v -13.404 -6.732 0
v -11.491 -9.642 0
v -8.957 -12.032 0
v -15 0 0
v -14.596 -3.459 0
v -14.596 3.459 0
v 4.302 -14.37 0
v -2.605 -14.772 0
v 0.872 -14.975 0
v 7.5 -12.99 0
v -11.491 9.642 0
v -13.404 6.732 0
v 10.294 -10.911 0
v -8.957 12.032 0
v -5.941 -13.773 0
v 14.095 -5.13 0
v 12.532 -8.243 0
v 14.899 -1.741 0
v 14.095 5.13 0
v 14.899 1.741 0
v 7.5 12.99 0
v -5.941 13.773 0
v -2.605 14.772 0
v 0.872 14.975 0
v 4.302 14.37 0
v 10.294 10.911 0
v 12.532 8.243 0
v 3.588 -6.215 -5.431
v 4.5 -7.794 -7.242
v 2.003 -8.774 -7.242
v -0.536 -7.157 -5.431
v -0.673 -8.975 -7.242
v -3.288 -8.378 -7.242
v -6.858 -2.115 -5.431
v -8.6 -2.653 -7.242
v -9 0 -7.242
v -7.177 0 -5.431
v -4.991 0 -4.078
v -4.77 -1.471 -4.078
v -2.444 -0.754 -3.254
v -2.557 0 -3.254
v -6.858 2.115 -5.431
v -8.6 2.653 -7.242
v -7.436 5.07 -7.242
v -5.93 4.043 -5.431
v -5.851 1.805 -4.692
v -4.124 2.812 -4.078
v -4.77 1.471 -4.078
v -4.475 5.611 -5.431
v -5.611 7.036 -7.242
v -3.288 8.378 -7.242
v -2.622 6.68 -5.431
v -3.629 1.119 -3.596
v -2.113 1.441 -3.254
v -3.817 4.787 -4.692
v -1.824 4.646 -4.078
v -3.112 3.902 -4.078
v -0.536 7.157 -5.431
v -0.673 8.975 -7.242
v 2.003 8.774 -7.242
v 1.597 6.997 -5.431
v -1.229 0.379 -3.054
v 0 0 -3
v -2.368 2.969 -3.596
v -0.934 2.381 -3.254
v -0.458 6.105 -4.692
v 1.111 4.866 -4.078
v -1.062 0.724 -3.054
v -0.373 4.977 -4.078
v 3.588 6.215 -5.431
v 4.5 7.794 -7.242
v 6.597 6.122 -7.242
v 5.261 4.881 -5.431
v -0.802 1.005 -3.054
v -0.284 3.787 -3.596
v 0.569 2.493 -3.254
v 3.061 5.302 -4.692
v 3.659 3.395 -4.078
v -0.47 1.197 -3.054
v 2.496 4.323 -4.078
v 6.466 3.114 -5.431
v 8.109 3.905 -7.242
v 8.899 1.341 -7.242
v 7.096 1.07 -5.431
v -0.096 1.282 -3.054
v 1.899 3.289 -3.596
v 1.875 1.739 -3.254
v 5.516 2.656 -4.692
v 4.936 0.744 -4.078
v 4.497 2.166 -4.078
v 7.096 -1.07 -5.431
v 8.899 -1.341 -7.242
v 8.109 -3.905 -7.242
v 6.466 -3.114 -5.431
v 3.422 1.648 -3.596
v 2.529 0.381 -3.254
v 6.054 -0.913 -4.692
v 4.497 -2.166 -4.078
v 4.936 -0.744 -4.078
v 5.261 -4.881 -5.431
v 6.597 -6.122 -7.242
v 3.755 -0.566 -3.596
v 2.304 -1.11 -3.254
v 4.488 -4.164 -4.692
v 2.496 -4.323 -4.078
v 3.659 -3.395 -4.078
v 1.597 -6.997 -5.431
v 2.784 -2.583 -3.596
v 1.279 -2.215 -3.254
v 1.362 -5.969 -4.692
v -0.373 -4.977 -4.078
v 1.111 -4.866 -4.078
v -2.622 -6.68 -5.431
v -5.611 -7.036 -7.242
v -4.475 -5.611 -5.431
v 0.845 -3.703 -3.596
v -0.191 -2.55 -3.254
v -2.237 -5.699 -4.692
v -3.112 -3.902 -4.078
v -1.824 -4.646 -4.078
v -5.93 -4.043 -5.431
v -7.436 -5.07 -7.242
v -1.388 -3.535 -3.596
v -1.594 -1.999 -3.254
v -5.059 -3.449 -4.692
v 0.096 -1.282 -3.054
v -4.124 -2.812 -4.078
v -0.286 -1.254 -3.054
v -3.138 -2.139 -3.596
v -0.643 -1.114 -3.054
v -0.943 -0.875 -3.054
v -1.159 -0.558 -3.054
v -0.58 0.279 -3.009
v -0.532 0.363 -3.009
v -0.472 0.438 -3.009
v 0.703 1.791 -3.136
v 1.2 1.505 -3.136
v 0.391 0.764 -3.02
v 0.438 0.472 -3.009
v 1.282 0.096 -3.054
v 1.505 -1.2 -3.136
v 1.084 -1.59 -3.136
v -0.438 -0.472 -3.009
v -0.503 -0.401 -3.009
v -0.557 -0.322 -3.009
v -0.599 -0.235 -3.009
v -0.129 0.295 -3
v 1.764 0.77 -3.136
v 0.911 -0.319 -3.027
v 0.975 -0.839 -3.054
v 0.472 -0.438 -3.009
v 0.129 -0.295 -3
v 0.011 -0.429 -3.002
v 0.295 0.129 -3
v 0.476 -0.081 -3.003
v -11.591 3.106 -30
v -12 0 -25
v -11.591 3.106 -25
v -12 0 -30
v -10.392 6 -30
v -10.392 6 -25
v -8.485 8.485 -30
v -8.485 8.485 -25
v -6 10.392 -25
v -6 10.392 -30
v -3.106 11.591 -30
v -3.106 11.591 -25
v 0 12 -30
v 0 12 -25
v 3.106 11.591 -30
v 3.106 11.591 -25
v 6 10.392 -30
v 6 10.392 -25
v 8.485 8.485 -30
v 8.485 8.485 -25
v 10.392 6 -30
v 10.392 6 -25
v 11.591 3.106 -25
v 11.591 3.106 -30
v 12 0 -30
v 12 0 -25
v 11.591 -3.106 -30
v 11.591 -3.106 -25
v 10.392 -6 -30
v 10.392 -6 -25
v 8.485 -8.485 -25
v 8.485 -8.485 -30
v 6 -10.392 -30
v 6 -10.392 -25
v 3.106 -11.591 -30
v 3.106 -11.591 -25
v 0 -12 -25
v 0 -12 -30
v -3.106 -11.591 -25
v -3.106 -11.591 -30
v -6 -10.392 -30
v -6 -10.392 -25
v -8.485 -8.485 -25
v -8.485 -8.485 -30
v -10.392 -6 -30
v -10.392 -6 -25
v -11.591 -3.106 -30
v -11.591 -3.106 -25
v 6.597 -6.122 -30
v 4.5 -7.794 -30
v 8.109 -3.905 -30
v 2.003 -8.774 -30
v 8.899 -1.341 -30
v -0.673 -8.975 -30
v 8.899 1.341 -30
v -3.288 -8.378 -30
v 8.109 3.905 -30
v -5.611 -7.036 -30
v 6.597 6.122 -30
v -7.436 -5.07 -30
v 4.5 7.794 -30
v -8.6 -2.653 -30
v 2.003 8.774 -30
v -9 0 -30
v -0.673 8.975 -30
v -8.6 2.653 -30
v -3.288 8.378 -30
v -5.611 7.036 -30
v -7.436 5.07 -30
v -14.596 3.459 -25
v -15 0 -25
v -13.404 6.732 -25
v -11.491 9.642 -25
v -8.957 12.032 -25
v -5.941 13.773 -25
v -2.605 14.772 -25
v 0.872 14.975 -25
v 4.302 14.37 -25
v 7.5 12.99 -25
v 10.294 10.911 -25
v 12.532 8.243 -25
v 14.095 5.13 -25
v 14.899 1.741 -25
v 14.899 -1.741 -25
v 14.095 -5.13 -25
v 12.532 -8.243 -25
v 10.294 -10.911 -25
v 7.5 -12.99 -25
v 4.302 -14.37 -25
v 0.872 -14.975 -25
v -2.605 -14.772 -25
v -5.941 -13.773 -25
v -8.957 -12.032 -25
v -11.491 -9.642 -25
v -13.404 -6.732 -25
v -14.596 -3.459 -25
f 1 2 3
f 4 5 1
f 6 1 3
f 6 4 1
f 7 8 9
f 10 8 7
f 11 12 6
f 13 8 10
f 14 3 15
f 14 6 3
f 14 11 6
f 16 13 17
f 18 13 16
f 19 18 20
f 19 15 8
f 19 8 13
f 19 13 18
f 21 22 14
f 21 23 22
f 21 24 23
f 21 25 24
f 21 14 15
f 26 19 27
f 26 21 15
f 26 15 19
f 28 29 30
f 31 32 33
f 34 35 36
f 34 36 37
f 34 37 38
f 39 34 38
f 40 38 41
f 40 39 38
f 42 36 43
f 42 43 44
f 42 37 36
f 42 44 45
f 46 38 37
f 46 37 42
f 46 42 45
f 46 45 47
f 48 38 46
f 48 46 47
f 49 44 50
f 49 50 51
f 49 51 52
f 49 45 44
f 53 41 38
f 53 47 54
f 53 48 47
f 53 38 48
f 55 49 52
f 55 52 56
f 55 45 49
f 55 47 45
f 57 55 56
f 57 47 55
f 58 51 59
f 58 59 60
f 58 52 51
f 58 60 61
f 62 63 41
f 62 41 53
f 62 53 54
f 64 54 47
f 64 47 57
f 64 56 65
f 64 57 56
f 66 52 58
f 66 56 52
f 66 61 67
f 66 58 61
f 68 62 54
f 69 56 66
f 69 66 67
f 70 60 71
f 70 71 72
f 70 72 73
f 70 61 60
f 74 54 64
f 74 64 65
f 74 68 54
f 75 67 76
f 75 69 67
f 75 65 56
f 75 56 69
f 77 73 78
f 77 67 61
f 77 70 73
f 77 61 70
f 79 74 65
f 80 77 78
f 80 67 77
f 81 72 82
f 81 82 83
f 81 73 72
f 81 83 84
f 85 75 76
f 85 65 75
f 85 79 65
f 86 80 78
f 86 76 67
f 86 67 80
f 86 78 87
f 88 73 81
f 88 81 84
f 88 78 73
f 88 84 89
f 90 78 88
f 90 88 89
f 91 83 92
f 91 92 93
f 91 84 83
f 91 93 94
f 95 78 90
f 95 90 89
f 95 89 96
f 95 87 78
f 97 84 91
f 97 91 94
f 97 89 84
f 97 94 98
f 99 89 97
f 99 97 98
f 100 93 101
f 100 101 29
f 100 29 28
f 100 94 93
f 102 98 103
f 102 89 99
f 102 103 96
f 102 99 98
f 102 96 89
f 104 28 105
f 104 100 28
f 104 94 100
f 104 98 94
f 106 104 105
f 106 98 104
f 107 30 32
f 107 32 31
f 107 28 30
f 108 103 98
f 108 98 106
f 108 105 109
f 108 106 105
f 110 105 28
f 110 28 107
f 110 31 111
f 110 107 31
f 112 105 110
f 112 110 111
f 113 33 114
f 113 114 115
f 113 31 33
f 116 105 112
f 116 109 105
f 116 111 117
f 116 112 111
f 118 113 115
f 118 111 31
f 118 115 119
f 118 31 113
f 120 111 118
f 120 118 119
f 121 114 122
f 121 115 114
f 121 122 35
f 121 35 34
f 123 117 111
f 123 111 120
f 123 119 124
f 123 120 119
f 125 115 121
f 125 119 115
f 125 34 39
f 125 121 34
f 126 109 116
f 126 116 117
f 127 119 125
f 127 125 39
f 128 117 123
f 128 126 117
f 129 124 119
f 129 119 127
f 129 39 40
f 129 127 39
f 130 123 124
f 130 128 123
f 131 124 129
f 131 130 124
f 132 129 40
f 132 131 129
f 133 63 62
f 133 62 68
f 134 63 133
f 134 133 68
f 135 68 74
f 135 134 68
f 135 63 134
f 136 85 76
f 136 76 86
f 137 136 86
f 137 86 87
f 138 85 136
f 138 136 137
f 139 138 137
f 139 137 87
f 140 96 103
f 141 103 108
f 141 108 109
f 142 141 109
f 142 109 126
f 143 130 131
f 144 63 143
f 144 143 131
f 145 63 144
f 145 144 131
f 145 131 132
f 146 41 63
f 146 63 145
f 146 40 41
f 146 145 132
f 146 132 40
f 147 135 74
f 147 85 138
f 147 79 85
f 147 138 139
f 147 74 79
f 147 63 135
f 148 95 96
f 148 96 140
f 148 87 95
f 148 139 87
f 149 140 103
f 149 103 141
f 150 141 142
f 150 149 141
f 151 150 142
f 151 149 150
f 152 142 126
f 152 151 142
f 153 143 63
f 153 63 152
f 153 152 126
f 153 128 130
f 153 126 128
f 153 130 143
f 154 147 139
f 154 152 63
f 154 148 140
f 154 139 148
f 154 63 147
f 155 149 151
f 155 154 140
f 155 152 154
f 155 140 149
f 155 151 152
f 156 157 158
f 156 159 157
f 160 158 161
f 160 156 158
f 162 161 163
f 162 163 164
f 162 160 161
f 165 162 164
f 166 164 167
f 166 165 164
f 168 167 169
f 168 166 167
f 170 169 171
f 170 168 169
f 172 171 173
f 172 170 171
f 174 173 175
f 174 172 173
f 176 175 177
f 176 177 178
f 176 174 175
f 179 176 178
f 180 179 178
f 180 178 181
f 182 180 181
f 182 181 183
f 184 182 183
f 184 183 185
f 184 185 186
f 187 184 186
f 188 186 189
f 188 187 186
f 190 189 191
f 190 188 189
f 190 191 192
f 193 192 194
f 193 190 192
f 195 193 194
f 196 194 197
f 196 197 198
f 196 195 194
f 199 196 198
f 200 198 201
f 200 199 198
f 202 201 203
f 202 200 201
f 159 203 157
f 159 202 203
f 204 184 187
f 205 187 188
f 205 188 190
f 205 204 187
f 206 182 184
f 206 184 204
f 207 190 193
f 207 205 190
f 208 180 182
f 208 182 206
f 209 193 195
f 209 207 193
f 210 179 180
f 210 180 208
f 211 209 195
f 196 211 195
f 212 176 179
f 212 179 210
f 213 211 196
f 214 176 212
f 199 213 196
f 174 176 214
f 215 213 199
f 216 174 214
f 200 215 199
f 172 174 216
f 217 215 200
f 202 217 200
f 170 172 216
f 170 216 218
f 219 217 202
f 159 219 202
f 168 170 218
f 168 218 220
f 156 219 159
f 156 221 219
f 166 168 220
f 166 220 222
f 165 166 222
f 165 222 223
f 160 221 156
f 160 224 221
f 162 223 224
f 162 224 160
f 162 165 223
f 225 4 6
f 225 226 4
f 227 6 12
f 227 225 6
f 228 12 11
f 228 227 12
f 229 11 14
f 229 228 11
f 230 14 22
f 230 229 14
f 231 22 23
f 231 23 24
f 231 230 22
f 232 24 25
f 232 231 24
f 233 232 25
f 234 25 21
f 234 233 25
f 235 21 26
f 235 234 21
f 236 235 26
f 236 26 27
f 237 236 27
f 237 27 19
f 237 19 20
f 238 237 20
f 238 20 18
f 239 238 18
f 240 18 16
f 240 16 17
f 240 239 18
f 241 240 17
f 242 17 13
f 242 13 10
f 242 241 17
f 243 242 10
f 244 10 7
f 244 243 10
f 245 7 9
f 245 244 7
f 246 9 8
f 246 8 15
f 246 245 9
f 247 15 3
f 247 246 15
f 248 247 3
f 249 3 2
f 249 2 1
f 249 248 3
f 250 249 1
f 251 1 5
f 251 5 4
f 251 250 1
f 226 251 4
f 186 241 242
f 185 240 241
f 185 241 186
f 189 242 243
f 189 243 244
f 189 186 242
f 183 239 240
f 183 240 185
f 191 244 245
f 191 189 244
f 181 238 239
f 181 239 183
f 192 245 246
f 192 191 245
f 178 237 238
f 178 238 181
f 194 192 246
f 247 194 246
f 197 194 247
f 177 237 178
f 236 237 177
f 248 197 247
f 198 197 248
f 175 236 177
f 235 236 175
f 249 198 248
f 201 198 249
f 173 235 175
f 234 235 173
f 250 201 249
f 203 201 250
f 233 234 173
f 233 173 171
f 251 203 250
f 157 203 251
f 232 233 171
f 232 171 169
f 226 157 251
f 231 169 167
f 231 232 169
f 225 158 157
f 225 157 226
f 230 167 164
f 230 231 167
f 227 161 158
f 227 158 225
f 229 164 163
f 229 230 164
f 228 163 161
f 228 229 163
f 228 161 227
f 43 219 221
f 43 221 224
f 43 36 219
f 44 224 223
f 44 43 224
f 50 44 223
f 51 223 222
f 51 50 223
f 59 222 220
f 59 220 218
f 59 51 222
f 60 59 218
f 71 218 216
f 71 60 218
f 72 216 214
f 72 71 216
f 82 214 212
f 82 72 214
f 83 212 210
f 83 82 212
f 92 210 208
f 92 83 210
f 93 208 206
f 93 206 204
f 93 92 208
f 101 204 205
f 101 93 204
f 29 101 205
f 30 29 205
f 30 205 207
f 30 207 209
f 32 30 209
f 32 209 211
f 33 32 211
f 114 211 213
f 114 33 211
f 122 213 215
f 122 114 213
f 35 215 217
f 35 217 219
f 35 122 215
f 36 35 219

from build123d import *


# Not quite as in the source:
# - a feature names something its author has since deleted; it is built from what else it names


with BuildPart() as f1:
    # F0 (on Front) → F1 (revolve)
    with BuildSketch(Plane.XZ):
        with BuildLine():
            Line((-15, -25), (-12, -25))
            Line((-12, -25), (-12, -30))
            Line((-12, -30), (-9, -30))
            Line((-9, -30), (-9, -7.2415010072))
            ThreePointArc((-9, -7.2415010072), (-4.9914312836, -4.0779872119), (0, -3))
            Line((0, -3), (0, 0))
            Line((0, 0), (-15, 0))
            Line((-15, 0), (-15, -3))
            Line((-15, -3), (-15, -25))
        make_face()
    revolve(axis=Axis((0, 0, -1.5), (0, 0, -1)))


solid = f1.part
